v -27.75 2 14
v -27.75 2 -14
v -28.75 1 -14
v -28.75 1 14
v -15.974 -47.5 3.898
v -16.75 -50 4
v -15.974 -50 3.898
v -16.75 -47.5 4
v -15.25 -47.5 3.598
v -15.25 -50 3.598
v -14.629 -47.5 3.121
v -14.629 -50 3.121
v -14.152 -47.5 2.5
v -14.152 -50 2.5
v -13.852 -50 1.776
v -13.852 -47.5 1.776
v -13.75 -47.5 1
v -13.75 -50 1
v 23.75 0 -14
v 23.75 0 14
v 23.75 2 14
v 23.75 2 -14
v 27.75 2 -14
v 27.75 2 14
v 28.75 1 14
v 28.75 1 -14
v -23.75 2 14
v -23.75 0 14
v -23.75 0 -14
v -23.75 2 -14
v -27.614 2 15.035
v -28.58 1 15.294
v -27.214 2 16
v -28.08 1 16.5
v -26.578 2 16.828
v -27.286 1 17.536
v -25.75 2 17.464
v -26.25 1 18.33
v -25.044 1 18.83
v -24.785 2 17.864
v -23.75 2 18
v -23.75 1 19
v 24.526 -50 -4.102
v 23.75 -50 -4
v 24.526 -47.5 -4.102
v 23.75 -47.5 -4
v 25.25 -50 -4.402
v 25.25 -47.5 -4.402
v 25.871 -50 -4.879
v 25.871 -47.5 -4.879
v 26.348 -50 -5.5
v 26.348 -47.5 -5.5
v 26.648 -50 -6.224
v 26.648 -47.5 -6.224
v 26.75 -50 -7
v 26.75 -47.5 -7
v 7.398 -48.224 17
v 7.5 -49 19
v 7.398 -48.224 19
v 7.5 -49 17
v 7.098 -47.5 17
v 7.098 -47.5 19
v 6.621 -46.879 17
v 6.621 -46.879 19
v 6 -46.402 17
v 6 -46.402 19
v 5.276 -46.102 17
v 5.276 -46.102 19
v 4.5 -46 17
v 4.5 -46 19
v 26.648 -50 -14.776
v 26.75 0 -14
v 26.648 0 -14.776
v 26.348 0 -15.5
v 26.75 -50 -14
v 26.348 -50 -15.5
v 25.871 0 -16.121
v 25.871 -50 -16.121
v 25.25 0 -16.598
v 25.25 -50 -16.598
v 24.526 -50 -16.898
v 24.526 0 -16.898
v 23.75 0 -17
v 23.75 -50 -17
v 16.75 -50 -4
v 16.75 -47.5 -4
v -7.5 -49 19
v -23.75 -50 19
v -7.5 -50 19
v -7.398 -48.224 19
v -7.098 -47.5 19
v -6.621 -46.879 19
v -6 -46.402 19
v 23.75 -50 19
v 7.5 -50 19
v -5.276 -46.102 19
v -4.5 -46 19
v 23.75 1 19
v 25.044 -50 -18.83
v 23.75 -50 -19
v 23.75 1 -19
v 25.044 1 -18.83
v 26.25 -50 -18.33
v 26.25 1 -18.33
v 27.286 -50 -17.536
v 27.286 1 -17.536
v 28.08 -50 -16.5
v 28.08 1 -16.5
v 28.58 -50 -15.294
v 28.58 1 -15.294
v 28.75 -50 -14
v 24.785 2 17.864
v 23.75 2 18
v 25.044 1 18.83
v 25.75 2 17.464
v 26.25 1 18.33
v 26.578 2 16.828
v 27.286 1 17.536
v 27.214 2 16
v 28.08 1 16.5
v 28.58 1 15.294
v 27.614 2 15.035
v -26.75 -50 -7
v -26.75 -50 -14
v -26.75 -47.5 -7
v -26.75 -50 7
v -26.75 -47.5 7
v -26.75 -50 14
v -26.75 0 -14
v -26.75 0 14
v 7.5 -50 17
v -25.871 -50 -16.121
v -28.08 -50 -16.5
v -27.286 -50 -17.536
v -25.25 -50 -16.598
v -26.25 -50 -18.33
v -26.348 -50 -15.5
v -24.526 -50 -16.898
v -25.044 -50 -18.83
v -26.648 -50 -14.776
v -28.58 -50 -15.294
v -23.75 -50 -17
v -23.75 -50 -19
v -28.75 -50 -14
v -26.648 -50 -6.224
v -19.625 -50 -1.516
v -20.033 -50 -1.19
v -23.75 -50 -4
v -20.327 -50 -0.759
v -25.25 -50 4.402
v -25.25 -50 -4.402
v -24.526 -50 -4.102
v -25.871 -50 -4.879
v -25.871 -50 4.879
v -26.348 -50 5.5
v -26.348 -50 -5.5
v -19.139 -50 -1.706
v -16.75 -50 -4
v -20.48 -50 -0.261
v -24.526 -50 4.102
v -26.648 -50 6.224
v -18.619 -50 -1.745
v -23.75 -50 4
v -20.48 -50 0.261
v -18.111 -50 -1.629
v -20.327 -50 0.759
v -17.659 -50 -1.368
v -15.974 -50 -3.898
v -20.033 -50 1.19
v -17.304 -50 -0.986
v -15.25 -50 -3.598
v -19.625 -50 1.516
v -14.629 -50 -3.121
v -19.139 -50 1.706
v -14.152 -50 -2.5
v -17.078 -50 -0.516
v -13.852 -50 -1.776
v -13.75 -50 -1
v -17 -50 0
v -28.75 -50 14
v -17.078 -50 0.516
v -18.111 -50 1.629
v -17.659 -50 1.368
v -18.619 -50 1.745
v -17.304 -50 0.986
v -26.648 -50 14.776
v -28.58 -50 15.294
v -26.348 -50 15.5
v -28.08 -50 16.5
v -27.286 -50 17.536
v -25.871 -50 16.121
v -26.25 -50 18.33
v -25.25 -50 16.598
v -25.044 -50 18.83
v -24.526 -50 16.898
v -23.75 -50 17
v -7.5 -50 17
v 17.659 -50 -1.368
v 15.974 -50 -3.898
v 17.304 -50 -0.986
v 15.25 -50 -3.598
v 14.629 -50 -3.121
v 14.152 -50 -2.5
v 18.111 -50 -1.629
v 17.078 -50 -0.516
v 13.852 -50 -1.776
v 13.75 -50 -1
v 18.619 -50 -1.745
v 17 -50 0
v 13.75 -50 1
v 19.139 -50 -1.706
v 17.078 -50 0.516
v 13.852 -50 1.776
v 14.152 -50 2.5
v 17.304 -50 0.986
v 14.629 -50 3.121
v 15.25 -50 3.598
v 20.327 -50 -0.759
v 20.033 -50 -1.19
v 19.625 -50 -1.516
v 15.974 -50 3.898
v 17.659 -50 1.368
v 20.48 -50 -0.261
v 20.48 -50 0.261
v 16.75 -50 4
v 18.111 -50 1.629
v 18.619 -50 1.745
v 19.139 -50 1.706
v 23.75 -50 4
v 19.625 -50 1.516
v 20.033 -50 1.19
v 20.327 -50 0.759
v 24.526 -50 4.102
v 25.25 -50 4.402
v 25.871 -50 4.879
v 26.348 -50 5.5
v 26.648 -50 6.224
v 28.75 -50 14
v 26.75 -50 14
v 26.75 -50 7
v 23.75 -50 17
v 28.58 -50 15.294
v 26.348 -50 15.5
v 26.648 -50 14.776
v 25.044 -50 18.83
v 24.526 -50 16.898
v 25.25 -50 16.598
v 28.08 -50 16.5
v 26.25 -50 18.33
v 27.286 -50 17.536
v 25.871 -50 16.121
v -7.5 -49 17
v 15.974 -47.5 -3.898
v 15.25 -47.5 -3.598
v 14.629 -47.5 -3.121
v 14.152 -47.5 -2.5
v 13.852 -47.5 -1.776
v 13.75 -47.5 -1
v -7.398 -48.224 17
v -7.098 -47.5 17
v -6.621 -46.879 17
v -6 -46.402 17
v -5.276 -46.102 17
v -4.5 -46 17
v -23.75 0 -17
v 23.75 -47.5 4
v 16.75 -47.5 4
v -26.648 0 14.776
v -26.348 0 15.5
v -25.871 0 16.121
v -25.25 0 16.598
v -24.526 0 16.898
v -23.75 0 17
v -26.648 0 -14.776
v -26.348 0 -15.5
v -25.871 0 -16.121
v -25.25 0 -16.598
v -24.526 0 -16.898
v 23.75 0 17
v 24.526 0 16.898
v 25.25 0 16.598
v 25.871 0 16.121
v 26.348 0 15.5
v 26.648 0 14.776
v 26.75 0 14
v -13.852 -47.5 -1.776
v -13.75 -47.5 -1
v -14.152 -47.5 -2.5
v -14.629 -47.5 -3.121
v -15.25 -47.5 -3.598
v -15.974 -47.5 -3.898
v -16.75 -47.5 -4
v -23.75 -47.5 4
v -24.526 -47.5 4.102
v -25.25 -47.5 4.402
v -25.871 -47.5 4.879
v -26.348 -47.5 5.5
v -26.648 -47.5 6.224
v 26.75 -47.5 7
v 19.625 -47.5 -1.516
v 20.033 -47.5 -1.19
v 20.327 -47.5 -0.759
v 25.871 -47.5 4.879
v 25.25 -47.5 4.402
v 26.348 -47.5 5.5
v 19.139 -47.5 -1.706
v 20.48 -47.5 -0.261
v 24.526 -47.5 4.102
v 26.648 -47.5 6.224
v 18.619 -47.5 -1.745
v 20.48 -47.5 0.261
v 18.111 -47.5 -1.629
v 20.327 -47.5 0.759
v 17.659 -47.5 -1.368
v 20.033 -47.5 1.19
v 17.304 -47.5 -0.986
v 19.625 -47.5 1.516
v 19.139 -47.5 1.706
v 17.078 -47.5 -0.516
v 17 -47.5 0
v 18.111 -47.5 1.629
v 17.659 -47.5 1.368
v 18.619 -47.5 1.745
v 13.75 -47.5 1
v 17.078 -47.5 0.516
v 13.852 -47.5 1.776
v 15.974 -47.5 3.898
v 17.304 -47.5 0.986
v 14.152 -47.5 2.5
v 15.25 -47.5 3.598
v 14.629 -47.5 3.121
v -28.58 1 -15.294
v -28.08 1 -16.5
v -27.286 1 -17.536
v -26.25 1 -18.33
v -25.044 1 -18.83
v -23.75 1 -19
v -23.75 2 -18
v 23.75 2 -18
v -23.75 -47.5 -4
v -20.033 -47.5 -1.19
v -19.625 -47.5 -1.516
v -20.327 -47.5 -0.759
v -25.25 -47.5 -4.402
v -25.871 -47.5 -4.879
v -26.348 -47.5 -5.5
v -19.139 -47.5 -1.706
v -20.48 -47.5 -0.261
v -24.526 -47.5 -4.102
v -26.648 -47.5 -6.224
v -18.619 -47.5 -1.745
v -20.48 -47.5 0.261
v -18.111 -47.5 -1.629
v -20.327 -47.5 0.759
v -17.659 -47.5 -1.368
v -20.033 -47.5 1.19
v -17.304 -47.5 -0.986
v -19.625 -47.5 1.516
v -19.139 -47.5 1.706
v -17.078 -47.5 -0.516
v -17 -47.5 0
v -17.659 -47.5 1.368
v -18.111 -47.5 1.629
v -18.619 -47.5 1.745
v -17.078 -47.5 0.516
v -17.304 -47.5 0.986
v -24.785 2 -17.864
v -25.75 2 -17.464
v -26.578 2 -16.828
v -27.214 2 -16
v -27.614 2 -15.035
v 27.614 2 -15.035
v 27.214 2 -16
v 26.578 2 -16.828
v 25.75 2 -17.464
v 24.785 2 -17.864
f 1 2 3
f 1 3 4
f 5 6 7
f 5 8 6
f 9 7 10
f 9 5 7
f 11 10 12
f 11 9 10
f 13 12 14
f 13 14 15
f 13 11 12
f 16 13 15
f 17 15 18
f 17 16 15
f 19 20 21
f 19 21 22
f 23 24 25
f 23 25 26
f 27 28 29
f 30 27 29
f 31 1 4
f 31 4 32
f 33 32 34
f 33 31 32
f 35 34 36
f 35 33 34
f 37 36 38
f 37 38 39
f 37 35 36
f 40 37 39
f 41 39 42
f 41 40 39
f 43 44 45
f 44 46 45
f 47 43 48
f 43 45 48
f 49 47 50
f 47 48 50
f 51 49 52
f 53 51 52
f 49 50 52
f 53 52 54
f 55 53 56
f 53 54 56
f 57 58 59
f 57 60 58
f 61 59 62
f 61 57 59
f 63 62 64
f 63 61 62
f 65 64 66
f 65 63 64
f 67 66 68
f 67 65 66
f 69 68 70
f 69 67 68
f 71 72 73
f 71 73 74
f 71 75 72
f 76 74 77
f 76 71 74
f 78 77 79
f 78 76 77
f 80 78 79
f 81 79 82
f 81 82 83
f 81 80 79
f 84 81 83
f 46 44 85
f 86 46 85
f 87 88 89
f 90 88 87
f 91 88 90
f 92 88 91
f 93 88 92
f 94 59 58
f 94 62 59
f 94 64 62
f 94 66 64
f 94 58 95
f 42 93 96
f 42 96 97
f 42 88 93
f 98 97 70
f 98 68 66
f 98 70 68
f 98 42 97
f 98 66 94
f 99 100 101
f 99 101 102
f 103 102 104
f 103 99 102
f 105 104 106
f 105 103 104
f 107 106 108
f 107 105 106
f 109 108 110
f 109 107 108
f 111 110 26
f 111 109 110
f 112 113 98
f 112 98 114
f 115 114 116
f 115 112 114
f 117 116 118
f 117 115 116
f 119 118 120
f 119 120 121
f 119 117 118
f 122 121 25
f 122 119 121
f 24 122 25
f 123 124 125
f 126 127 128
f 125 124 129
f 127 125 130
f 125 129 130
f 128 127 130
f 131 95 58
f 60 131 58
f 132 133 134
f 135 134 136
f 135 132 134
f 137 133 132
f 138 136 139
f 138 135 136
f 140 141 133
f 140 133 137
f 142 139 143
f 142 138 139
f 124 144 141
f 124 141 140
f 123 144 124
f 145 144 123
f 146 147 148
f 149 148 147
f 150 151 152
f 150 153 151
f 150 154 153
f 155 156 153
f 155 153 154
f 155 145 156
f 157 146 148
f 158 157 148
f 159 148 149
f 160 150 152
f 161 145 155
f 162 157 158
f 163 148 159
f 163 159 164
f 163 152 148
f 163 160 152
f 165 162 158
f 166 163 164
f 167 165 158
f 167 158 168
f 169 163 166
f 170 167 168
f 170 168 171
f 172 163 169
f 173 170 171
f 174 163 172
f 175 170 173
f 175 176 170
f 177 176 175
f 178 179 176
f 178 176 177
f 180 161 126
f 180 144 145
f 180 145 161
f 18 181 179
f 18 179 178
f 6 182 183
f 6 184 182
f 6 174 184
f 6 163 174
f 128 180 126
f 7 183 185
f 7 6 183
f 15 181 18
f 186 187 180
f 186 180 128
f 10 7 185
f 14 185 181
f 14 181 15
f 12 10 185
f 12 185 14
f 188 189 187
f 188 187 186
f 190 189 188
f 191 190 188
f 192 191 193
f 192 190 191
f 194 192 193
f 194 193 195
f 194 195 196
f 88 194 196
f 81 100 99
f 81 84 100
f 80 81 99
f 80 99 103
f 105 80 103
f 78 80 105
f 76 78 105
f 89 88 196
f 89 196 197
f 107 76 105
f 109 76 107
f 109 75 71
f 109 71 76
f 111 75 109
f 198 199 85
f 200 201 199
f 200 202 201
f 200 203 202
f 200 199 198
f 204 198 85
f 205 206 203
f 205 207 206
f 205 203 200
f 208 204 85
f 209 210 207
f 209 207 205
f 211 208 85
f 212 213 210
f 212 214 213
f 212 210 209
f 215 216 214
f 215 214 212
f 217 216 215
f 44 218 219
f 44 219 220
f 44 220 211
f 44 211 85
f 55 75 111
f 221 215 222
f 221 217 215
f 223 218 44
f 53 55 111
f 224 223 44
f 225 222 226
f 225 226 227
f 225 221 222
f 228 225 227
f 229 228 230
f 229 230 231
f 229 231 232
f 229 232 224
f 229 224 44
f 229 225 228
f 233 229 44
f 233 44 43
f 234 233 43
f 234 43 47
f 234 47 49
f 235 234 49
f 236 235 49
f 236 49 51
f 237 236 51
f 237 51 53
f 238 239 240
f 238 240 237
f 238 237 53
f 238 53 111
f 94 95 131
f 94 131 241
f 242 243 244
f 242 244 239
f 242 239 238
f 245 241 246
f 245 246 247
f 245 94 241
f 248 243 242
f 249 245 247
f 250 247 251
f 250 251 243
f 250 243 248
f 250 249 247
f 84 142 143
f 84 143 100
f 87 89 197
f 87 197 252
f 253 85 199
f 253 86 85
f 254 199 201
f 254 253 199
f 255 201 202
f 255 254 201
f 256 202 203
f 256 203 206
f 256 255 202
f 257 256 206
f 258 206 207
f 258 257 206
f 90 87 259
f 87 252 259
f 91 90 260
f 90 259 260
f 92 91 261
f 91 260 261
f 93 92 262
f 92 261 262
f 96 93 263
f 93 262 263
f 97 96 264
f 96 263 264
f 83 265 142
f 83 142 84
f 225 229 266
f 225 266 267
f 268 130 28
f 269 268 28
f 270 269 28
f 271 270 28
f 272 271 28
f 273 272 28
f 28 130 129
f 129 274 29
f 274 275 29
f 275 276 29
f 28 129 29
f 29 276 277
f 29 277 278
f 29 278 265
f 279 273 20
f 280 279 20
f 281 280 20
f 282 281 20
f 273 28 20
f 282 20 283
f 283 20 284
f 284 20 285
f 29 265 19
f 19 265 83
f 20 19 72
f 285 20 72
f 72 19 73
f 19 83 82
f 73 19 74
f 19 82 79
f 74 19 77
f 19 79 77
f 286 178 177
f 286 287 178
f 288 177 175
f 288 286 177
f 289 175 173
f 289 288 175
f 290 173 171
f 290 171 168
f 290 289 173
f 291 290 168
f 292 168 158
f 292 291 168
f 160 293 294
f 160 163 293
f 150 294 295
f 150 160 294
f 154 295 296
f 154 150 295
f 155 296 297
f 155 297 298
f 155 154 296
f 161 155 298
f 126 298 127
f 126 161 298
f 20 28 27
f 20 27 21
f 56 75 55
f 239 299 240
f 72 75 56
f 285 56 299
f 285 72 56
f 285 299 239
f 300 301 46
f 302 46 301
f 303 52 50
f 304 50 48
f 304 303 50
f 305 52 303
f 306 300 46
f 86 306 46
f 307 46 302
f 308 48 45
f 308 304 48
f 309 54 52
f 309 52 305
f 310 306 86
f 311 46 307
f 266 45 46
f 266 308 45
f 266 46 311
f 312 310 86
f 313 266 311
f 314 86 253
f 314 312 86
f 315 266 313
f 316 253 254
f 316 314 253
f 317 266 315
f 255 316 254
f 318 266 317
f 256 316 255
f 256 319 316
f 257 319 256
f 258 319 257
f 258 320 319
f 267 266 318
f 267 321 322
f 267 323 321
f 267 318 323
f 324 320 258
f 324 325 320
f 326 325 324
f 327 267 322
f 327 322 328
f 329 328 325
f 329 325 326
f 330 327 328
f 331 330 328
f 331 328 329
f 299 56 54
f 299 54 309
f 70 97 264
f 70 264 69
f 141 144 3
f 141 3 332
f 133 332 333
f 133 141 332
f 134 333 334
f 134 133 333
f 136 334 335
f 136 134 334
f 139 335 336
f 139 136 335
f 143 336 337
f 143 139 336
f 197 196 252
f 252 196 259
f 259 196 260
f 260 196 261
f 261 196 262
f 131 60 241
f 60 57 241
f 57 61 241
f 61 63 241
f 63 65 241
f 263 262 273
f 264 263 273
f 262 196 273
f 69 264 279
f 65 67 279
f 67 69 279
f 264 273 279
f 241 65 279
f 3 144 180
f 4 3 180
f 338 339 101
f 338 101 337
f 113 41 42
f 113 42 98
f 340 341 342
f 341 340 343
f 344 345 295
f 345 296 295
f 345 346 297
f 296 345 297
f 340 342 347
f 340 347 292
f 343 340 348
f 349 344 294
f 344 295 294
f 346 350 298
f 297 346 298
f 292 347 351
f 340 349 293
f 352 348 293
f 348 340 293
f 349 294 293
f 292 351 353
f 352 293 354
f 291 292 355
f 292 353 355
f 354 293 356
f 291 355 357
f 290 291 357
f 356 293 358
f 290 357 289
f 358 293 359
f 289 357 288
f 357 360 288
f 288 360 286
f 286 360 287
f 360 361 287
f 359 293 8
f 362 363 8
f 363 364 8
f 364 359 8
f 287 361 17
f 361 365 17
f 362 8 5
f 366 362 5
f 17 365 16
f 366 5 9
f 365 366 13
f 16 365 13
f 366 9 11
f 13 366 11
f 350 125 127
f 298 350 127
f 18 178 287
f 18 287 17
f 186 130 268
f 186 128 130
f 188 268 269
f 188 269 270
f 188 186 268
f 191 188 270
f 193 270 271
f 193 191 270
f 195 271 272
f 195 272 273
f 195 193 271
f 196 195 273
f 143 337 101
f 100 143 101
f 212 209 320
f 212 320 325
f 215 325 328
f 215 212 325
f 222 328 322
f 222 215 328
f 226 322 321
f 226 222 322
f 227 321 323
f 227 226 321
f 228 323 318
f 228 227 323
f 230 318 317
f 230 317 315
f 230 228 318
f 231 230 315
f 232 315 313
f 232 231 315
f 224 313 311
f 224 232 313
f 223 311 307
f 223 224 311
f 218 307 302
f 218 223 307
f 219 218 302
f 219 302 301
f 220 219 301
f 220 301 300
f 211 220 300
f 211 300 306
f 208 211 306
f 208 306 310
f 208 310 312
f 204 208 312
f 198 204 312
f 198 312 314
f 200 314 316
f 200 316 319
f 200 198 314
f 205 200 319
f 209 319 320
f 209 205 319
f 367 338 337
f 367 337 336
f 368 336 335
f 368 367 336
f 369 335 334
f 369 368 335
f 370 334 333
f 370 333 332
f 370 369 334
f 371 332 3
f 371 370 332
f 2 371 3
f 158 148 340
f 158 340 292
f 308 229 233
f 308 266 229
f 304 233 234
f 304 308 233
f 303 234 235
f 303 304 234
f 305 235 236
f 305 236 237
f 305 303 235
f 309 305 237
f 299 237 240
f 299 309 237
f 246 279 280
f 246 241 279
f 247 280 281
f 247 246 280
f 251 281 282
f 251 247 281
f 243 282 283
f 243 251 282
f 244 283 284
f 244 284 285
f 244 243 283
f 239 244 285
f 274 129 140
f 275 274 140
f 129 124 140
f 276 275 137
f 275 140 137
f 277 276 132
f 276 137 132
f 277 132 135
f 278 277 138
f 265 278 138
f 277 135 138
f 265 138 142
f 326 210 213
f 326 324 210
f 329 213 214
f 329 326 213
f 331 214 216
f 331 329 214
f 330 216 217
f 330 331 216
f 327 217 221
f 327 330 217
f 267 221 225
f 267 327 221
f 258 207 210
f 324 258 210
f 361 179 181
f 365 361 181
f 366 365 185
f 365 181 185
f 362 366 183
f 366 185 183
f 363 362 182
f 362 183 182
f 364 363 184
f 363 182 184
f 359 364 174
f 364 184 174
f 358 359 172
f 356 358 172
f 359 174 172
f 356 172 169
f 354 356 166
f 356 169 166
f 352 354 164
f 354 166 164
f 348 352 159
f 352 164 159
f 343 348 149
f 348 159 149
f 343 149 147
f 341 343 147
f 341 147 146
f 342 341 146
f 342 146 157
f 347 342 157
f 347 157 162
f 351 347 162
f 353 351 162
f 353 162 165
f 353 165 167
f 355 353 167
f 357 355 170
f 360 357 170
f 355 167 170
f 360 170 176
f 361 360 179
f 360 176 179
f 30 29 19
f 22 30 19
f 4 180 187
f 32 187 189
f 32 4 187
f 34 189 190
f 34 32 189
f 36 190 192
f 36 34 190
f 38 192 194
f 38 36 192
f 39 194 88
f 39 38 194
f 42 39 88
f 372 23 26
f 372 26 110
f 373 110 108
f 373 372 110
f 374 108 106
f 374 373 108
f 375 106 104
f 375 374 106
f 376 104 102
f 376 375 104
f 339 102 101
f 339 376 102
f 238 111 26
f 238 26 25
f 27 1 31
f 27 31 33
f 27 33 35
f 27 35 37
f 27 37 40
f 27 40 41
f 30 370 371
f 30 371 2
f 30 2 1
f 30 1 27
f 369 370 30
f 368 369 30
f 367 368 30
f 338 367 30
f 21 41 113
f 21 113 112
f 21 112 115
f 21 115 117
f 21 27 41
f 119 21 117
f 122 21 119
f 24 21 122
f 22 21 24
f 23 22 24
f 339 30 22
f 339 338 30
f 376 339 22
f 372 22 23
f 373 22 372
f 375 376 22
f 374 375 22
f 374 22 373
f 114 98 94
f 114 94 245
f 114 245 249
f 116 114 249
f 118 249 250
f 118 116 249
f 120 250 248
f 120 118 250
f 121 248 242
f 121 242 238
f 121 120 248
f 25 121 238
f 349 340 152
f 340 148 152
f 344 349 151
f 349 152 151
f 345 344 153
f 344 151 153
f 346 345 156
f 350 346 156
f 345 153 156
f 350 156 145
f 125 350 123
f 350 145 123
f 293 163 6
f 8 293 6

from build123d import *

# Parameters (mm, degrees)
SKETCH2_W           = 57.5
SKETCH2_H           = 38
SKETCH2_W_2         = 47.5
SKETCH2_H_2         = 28
BOSS_EXTRUDE1_DEPTH = 2
SKETCH3_W           = 57.5
SKETCH3_H           = 38
SKETCH3_W_2         = 53.5
SKETCH3_H_2         = 34
BOSS_EXTRUDE2_DEPTH = 50
FILLET1_R           = 3
FILLET2_R           = 5
SKETCH4_W           = 15
SKETCH4_H           = 4
CUT_EXTRUDE1_DEPTH  = 2
FILLET3_R           = 3
CHAMFER1_SIZE       = 1
SKETCH6_W           = 15
SKETCH6_H           = 8
SKETCH6_R           = 1.75
BOSS_EXTRUDE3_DEPTH = 2.5
FILLET4_R           = 3


with BuildPart() as part:
    # Sketch2 → Boss-Extrude1 (new body)
    with BuildSketch(Plane(origin=(0, 0, 0), x_dir=(1, 0, 0), z_dir=(0, 1, 0))):
        Rectangle(SKETCH2_W, SKETCH2_H)
        Rectangle(SKETCH2_W_2, SKETCH2_H_2, mode=Mode.SUBTRACT)
    extrude(amount=BOSS_EXTRUDE1_DEPTH)

    # Sketch3 → Boss-Extrude2 (add)
    with BuildSketch(Plane.XZ):
        Rectangle(SKETCH3_W, SKETCH3_H)
        Rectangle(SKETCH3_W_2, SKETCH3_H_2, mode=Mode.SUBTRACT)
    extrude(amount=BOSS_EXTRUDE2_DEPTH)

    # Fillet1
    fillet1_edges = [part.edges().sort_by_distance(p)[0] for p in [
        (26.75, -25, -17),
        (26.75, -25, 17),
        (-26.75, -25, 17),
        (-26.75, -25, -17),
    ]]
    fillet(fillet1_edges, radius=FILLET1_R)

    # Fillet2
    fillet2_edges = [part.edges().sort_by_distance(p)[0] for p in [
        (28.75, -24, 19),
        (-28.75, -24, 19),
        (-28.75, -24, -19),
        (28.75, -24, -19),
    ]]
    fillet(fillet2_edges, radius=FILLET2_R)

    # Sketch4 → Cut-Extrude1 (cut)
    with BuildSketch(Plane.XY.offset(19)):
        with Locations((0, -48)):
            Rectangle(SKETCH4_W, SKETCH4_H)
    extrude(amount=-CUT_EXTRUDE1_DEPTH, mode=Mode.SUBTRACT)

    # Fillet3
    fillet3_edges = [part.edges().sort_by_distance(p)[0] for p in [
        (7.5, -46, 18),
        (-7.5, -46, 18),
    ]]
    fillet(fillet3_edges, radius=FILLET3_R)

    # Chamfer1
    chamfer1_edges = [part.edges().sort_by_distance(p)[0] for p in [
        (0, 2, 19),
        (-28.75, 2, 0),
        (28.75, 2, 0),
        (0, 2, -19),
        (27.285533906, 2, 17.535533906),
        (27.285533906, 2, -17.535533906),
        (-27.285533906, 2, -17.535533906),
        (-27.285533906, 2, 17.535533906),
    ]]
    chamfer(chamfer1_edges, length=CHAMFER1_SIZE)

    # Sketch6 → Boss-Extrude3 (add)
    with BuildSketch(Plane.XZ.offset(50)):
        with Locations((-21.25, 0)):
            Rectangle(SKETCH6_W, SKETCH6_H)
        with Locations((-18.75, 0)):
            Circle(SKETCH6_R, mode=Mode.SUBTRACT)
    boss_extrude3 = extrude(amount=-BOSS_EXTRUDE3_DEPTH)

    # Mirror1: Boss-Extrude3 across plane
    add(boss_extrude3.mirror(Plane(origin=(0, 0, 0), x_dir=(0, 0, 1), z_dir=(1, 0, 0))))

    # Fillet4
    fillet4_edges = [part.edges().sort_by_distance(p)[0] for p in [
        (-26.75, -48.75, -4),
        (-26.75, -48.75, 4),
        (-13.75, -48.75, 4),
        (-13.75, -48.75, -4),
        (26.75, -48.75, 4),
        (26.75, -48.75, -4),
        (13.75, -48.75, -4),
        (13.75, -48.75, 4),
    ]]
    fillet(fillet4_edges, radius=FILLET4_R)


solid = part.part
